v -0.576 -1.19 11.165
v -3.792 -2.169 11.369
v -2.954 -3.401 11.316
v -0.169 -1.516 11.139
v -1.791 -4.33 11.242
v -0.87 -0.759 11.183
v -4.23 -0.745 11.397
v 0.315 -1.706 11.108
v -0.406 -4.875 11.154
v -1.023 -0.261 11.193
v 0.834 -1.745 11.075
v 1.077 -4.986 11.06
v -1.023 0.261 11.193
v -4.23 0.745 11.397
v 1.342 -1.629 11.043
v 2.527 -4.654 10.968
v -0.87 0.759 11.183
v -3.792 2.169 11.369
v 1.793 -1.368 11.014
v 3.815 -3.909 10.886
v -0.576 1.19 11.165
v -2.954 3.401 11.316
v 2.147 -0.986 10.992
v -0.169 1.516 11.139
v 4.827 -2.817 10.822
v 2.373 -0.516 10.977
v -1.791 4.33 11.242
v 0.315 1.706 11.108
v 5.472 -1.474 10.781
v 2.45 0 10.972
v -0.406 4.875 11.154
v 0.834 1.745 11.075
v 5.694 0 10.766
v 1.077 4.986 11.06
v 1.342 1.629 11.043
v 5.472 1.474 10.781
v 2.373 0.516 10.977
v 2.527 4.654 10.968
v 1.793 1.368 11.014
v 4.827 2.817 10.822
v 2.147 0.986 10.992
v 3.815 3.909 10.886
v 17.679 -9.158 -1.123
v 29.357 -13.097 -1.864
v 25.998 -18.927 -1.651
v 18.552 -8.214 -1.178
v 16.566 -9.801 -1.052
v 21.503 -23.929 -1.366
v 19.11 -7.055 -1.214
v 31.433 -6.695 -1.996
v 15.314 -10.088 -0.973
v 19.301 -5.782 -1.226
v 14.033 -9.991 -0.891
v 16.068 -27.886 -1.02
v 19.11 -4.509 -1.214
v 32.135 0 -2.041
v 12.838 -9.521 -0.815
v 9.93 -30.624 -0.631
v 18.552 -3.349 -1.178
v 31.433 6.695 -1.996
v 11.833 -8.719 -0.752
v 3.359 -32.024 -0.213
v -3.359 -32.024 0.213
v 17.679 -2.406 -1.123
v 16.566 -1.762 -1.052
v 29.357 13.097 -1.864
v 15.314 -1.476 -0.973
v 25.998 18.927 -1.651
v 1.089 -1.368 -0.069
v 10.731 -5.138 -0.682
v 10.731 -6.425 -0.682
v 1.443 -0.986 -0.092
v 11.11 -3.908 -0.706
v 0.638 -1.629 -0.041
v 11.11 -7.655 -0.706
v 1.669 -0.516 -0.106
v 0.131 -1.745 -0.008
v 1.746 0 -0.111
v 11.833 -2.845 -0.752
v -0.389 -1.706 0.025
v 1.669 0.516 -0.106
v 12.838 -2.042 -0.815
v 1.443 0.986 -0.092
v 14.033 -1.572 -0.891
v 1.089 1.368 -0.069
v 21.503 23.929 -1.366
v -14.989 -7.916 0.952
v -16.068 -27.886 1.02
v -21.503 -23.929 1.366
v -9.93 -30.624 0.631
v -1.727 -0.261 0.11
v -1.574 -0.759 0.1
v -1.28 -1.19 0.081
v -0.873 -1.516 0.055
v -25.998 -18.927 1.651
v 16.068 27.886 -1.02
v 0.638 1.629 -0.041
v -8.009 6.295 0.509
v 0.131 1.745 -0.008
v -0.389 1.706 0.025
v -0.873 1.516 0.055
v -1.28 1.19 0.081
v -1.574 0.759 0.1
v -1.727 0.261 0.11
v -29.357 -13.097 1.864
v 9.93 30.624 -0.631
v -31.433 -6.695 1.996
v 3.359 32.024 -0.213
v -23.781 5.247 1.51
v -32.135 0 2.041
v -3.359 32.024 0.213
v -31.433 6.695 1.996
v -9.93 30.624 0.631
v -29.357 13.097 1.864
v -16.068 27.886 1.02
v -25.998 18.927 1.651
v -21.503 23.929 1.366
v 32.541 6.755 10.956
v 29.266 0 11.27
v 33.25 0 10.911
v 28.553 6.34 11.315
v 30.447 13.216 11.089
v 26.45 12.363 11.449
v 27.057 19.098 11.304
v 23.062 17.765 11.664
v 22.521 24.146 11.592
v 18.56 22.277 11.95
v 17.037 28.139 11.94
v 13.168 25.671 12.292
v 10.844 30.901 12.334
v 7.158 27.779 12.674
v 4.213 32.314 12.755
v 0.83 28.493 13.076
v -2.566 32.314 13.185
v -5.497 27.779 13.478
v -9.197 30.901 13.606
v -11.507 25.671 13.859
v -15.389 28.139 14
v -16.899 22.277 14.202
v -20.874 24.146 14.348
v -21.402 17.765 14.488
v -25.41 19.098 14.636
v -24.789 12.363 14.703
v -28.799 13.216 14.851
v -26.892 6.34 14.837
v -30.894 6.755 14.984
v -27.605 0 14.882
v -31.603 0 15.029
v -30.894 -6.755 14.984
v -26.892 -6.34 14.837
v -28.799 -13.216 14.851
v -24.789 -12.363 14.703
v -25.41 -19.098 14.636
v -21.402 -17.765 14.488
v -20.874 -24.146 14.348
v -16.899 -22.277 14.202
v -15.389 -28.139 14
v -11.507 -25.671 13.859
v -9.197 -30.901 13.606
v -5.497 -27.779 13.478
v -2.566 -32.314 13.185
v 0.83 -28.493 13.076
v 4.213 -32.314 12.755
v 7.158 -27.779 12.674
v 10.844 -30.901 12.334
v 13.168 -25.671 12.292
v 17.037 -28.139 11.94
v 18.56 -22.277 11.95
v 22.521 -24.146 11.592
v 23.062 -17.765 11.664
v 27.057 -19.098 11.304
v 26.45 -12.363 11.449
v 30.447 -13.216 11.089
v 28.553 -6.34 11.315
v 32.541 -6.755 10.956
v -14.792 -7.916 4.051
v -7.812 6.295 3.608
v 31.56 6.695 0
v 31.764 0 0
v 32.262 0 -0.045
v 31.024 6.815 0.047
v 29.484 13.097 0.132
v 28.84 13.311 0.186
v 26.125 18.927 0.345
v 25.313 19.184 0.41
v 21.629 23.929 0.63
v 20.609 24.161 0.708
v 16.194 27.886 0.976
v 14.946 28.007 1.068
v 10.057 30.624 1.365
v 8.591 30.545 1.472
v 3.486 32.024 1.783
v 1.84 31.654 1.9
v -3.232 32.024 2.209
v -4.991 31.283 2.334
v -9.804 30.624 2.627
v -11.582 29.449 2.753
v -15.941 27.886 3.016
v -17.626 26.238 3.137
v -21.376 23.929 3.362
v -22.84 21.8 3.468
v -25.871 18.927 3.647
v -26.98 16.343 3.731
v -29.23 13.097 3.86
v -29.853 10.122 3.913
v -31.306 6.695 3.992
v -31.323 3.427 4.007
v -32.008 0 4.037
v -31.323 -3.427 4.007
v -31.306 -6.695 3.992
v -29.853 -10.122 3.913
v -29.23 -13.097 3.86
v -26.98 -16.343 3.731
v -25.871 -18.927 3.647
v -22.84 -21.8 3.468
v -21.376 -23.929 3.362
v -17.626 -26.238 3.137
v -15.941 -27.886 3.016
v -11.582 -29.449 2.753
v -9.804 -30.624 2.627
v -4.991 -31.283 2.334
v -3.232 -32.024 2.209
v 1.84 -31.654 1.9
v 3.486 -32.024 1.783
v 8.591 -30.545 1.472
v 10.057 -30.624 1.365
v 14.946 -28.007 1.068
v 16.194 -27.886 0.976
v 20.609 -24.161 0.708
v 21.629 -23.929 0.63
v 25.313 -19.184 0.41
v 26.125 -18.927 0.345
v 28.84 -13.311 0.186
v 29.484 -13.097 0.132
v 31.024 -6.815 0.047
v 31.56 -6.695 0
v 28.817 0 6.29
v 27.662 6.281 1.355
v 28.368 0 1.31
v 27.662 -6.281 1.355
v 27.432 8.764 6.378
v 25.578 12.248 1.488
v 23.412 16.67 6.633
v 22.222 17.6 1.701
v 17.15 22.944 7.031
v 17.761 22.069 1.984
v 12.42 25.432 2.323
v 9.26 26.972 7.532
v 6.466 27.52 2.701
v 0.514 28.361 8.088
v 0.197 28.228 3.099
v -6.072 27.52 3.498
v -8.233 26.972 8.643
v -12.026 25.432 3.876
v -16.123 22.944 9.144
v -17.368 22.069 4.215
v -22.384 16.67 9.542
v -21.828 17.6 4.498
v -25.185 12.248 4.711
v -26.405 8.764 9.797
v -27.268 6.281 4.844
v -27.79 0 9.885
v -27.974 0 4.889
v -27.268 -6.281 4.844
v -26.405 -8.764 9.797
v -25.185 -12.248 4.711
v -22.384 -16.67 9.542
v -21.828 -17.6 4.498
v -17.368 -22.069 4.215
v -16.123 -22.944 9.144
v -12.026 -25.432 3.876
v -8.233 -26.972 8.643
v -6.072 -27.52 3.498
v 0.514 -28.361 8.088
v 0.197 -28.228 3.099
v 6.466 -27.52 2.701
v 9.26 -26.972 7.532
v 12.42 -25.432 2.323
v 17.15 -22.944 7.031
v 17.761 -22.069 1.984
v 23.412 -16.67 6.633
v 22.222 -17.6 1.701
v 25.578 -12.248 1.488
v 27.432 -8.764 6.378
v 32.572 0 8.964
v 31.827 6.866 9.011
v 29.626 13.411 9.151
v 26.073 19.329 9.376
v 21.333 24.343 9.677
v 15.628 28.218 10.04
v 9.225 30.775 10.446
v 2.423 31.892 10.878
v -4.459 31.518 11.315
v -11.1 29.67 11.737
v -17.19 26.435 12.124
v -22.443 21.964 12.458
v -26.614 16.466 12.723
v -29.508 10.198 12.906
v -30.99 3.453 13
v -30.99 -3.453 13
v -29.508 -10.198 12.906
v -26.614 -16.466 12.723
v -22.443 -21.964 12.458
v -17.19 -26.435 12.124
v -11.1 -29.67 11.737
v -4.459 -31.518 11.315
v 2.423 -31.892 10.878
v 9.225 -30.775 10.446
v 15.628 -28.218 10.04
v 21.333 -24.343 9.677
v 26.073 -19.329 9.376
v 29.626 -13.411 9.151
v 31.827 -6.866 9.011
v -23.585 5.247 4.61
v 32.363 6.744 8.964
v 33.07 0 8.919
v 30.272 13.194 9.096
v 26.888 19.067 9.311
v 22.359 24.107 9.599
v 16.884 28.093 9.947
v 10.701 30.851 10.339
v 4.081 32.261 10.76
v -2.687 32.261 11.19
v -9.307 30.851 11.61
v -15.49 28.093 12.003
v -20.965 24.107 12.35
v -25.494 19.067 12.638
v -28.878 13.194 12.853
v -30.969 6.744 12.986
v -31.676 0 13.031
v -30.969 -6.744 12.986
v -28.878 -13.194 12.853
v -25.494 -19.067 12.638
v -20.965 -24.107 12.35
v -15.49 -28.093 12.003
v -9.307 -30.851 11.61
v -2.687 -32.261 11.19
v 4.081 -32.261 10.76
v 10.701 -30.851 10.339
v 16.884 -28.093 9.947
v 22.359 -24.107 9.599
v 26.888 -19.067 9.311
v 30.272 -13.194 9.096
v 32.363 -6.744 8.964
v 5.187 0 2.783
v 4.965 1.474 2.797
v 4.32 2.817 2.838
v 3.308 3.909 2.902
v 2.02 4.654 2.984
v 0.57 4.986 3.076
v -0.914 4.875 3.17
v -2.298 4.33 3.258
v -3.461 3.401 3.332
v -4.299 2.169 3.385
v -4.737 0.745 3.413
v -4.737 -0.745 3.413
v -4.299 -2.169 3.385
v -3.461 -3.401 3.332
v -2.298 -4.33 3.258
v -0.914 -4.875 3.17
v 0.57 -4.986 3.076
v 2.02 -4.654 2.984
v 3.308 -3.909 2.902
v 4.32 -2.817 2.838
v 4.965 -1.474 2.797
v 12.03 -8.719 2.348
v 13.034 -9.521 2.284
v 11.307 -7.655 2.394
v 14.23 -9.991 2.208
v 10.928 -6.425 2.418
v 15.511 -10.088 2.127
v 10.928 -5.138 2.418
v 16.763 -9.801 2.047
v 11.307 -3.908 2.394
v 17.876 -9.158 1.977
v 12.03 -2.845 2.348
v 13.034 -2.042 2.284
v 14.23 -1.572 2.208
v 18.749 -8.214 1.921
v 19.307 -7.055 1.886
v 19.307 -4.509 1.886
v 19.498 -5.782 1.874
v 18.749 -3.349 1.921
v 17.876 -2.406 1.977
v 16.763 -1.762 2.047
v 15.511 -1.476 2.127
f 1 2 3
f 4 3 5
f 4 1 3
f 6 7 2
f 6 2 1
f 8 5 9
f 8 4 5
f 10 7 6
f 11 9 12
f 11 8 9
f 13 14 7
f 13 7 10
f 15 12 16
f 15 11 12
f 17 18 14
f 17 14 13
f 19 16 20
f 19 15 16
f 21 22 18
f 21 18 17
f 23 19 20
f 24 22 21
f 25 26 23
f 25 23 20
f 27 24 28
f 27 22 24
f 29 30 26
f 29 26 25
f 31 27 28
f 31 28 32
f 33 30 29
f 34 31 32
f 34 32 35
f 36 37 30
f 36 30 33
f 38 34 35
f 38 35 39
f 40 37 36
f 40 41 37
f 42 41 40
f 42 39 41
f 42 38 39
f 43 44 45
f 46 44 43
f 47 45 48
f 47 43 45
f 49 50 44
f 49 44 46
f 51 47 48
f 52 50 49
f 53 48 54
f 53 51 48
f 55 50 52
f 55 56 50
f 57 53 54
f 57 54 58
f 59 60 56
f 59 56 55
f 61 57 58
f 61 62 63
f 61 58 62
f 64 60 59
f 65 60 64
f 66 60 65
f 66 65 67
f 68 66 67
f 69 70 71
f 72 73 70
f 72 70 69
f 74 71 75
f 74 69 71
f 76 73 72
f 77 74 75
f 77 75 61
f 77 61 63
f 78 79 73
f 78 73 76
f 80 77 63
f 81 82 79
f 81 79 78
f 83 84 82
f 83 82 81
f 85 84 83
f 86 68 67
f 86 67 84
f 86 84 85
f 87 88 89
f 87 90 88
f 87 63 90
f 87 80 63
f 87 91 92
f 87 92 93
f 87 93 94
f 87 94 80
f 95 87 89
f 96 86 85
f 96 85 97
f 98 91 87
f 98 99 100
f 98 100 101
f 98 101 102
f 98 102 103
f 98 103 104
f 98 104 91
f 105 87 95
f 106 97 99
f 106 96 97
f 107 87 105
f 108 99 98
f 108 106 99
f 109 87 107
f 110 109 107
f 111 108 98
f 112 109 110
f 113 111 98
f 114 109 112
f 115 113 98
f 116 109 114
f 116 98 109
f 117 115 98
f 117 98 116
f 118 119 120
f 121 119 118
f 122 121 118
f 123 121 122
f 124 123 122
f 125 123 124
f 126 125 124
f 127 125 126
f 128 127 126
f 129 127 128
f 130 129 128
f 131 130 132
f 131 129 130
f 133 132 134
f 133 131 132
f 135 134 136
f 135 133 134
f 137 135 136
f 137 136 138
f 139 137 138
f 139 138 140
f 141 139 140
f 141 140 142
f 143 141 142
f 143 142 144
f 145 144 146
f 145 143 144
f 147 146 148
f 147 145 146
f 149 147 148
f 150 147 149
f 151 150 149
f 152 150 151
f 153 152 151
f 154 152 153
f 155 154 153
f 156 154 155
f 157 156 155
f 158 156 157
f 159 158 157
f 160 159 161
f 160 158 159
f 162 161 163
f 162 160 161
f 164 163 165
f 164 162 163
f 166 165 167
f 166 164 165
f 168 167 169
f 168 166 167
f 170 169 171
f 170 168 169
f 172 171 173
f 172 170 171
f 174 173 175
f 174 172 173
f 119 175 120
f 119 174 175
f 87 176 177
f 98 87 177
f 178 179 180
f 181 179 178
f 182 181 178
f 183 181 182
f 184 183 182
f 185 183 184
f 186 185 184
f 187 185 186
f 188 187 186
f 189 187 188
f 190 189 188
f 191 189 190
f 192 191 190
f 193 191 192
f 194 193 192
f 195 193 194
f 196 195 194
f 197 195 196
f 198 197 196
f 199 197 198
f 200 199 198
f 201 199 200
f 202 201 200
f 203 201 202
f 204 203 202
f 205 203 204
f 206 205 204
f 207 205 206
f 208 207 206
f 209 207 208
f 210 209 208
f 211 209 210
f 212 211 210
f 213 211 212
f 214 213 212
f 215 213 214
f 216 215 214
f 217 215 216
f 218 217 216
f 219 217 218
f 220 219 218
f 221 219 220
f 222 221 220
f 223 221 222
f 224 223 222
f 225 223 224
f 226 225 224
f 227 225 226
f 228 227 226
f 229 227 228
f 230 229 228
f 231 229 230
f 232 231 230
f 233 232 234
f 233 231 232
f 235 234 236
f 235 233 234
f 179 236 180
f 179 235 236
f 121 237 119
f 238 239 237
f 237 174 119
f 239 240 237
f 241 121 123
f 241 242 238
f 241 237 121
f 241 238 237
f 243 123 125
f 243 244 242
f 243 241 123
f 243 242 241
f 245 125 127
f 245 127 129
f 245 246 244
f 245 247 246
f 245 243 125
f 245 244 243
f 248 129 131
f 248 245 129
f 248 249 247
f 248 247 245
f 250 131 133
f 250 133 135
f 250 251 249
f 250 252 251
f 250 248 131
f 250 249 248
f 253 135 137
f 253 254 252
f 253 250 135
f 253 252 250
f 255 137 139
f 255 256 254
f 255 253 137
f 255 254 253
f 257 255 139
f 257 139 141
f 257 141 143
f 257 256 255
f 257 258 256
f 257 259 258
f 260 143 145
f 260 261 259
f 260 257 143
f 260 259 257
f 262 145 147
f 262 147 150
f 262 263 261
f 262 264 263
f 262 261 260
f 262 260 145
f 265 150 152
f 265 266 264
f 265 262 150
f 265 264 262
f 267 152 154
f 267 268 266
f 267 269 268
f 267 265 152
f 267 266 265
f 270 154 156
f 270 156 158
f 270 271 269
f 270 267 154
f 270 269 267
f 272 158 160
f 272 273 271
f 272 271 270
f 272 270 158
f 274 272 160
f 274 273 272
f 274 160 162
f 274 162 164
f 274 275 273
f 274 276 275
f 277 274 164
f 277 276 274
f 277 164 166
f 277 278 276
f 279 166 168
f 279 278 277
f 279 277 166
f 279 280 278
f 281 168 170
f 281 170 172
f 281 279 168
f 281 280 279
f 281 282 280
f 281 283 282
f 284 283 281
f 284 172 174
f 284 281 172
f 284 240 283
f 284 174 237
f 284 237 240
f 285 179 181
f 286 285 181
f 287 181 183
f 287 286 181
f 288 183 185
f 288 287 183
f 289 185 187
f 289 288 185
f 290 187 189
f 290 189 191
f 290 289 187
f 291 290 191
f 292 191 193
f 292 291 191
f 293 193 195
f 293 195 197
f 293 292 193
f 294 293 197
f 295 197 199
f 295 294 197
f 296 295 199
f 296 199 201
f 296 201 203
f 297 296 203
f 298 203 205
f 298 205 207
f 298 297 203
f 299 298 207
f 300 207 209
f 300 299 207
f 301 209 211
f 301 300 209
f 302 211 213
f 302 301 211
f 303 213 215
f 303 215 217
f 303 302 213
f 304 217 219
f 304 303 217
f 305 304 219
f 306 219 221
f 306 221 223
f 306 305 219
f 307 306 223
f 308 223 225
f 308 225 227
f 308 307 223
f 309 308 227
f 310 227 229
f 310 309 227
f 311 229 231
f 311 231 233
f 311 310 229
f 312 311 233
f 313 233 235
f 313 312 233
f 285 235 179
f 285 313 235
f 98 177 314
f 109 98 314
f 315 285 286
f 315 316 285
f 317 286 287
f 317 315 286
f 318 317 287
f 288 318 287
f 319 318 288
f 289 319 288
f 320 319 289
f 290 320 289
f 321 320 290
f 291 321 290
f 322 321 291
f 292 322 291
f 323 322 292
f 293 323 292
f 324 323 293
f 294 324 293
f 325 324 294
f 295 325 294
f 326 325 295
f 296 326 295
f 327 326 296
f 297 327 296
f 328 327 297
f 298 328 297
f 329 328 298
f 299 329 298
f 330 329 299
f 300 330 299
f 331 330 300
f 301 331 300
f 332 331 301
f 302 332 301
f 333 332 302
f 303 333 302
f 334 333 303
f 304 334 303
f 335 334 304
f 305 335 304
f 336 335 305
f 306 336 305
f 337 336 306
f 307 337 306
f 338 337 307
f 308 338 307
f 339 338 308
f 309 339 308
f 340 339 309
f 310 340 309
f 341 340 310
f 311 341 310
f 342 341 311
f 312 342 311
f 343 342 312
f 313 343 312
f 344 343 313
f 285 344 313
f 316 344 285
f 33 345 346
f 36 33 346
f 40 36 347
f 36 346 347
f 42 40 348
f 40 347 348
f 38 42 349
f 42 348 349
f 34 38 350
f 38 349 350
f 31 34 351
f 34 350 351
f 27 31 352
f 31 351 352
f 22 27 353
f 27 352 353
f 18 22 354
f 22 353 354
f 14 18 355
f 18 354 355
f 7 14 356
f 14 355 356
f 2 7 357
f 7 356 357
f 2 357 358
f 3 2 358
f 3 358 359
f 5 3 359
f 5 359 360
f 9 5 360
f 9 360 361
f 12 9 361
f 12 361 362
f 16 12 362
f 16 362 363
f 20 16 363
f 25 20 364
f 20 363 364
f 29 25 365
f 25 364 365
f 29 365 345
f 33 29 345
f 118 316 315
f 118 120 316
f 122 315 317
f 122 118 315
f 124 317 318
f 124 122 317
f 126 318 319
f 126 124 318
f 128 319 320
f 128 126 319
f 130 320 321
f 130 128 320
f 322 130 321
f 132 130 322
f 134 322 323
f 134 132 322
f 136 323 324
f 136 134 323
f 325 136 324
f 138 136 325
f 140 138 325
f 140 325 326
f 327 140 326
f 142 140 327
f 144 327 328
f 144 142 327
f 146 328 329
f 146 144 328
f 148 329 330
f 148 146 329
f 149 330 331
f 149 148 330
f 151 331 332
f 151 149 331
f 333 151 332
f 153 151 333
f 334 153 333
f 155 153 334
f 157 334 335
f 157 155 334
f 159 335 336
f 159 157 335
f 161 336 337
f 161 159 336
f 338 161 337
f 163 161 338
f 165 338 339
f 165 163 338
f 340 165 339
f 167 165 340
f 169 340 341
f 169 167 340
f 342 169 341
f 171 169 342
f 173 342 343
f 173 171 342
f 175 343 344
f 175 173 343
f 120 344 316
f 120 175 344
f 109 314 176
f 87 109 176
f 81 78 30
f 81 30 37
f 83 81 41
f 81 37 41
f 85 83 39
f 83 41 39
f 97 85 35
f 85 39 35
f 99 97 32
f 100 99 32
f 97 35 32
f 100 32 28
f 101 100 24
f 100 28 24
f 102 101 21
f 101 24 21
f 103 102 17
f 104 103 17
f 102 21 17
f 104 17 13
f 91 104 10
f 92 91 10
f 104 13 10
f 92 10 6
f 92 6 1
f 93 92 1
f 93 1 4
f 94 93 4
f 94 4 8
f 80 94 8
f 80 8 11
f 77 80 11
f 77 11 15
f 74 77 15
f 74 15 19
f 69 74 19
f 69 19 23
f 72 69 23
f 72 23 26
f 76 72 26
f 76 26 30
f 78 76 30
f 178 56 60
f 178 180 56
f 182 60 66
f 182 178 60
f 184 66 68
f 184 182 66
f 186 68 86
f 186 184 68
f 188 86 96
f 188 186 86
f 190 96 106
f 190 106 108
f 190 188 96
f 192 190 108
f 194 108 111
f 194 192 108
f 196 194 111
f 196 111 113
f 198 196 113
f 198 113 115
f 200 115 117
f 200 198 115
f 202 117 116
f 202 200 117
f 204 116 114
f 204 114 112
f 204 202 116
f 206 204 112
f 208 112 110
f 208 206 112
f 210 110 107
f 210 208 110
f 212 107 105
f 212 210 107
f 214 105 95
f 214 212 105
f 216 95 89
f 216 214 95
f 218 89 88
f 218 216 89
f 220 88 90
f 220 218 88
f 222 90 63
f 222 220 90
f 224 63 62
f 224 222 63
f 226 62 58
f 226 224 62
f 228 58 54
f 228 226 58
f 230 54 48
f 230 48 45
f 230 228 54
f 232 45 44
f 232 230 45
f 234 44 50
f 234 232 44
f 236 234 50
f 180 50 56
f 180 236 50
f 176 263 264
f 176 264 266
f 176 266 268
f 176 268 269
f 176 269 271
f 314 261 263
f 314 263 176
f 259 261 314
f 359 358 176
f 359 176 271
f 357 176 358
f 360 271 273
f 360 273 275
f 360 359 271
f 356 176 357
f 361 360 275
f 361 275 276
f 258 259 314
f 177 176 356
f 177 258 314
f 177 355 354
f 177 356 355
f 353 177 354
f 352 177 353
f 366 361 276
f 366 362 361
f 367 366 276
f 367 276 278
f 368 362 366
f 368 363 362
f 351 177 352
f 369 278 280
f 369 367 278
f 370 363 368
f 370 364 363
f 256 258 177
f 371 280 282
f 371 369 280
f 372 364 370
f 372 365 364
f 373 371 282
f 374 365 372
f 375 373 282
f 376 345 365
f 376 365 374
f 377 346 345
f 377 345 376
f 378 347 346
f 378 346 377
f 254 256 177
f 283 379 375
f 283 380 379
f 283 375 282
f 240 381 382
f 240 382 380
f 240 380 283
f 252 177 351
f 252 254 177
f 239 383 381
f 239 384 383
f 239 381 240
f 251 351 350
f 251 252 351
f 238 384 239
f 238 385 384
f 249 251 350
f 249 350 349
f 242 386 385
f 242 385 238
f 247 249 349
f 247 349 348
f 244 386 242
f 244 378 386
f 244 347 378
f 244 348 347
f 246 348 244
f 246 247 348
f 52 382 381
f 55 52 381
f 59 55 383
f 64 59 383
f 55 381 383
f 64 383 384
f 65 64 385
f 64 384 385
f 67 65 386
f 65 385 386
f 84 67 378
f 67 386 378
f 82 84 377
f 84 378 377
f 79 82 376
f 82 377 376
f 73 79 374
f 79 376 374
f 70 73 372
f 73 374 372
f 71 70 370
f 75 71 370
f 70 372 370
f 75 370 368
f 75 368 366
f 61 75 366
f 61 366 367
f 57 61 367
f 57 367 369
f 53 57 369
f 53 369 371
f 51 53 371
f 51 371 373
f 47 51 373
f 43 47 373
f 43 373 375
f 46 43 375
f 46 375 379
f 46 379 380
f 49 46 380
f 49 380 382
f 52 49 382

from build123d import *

# Parameters (mm, degrees)
F2_R     = 5
F3_DEPTH = 8
F4_R     = 1.75
F5_DEPTH = 40
F6_R     = 4.3178383785
F7_DEPTH = 25


with BuildPart() as f1:
    # F0 (on Front) → F1 (revolve)
    with BuildSketch(Plane.XZ):
        Polygon((0.1968459624, 3.0994775003), (0, 0), (32.1352573357, -2.0408909744), (32.2620207502, -0.0449122579), (31.7640419464, 0), (32.5724625894, 8.9636184693), (33.0704413932, 8.9187062114), (33.250090425, 10.9106214268), (29.2662599942, 11.2699194904), (28.3680148353, 1.3103434133), align=None)
    revolve(axis=Axis((0.0987262279, 0, 1.554513582), (0.0633817073, 0, 0.9979893583)))

    # F2 (on face) → F3 (join)
    with BuildSketch(Plane(origin=(0.1968459624, 0, 3.0994775003), x_dir=(0.9979893583, 0, -0.0633817073), z_dir=(0.0633817073, 0, 0.9979893583))):
        Circle(F2_R)
    extrude(amount=F3_DEPTH)

    # F4 (on face) → F5 (cut)
    with BuildSketch(Plane(origin=(0.7038996206, 0, 11.0833923663), x_dir=(0.9979893583, 0, -0.0633817073), z_dir=(0.0633817073, 0, 0.9979893583))):
        Circle(F4_R)
    extrude(amount=-F5_DEPTH, mode=Mode.SUBTRACT)

    # F6 (on face) → F7 (cut)
    with BuildSketch(Plane(origin=(0.1968459624, 0, 3.0994775003), x_dir=(0.9979893583, 0, -0.0633817073), z_dir=(0.0633817073, 0, 0.9979893583))):
        Polygon((-23.8293290344, 5.2469611813), (-15.0192163679, -7.9159412247), (-8.0248648301, 6.2952913577), align=None)
        with Locations((15.0223076344, -5.7818233036)):
            Circle(F6_R)
    extrude(amount=-F7_DEPTH, mode=Mode.SUBTRACT)


solid = f1.part
